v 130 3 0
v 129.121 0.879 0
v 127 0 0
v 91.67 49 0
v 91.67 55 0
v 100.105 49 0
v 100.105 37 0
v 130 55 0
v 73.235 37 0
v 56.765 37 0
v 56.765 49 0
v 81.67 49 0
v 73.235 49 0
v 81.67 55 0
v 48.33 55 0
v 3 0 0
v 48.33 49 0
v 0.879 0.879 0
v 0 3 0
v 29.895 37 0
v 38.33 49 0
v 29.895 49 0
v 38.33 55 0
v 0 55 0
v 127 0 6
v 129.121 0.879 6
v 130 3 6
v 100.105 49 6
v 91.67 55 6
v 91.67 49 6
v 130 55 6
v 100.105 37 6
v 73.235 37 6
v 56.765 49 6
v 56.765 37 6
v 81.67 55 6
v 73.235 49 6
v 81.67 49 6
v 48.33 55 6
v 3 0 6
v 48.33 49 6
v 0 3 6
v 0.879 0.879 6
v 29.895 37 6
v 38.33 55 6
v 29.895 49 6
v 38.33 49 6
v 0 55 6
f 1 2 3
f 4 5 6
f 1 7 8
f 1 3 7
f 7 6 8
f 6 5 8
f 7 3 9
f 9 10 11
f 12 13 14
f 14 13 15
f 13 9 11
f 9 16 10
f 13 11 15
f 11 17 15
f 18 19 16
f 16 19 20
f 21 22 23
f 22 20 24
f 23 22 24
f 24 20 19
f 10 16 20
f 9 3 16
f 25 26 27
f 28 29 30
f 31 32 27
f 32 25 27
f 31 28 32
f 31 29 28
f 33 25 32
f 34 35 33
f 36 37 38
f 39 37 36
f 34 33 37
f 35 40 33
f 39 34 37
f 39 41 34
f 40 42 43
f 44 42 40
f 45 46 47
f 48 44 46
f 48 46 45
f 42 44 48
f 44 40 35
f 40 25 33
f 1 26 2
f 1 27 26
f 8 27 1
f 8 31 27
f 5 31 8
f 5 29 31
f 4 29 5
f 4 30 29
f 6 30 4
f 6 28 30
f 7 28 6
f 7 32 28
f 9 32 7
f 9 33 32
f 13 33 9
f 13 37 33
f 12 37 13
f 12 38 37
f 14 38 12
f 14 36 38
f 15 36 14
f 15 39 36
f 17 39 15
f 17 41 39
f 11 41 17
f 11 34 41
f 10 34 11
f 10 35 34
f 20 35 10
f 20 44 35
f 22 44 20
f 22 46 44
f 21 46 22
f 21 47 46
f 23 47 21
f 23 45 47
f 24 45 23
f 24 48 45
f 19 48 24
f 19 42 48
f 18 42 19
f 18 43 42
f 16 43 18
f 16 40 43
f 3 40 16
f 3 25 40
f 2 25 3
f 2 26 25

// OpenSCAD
$fn = 32;

// ----------------------------------------------------------------------
// Window plate: 130 x 55 mm, 2 open windows
// ----------------------------------------------------------------------

// --- parameters (mm) ---
profile_height = 6;       // extrusion height
profile_points = 24;      // points of the closed outline

profile = [[0, 3], [0.879, 0.879], [3, 0], [127, 0], [129.121, 0.879], [130, 3], [130, 55], [91.67, 55], [91.67, 49], [100.105, 49], [100.105, 37], [73.235, 37], [73.235, 49], [81.67, 49], [81.67, 55], [48.33, 55], [48.33, 49], [56.765, 49], [56.765, 37], [29.895, 37], [29.895, 49], [38.33, 49], [38.33, 55], [0, 55]];  // single closed polygon, 24 points, counter clockwise

// --- the one profile operation ---
linear_extrude(height = profile_height) polygon(points = profile);
